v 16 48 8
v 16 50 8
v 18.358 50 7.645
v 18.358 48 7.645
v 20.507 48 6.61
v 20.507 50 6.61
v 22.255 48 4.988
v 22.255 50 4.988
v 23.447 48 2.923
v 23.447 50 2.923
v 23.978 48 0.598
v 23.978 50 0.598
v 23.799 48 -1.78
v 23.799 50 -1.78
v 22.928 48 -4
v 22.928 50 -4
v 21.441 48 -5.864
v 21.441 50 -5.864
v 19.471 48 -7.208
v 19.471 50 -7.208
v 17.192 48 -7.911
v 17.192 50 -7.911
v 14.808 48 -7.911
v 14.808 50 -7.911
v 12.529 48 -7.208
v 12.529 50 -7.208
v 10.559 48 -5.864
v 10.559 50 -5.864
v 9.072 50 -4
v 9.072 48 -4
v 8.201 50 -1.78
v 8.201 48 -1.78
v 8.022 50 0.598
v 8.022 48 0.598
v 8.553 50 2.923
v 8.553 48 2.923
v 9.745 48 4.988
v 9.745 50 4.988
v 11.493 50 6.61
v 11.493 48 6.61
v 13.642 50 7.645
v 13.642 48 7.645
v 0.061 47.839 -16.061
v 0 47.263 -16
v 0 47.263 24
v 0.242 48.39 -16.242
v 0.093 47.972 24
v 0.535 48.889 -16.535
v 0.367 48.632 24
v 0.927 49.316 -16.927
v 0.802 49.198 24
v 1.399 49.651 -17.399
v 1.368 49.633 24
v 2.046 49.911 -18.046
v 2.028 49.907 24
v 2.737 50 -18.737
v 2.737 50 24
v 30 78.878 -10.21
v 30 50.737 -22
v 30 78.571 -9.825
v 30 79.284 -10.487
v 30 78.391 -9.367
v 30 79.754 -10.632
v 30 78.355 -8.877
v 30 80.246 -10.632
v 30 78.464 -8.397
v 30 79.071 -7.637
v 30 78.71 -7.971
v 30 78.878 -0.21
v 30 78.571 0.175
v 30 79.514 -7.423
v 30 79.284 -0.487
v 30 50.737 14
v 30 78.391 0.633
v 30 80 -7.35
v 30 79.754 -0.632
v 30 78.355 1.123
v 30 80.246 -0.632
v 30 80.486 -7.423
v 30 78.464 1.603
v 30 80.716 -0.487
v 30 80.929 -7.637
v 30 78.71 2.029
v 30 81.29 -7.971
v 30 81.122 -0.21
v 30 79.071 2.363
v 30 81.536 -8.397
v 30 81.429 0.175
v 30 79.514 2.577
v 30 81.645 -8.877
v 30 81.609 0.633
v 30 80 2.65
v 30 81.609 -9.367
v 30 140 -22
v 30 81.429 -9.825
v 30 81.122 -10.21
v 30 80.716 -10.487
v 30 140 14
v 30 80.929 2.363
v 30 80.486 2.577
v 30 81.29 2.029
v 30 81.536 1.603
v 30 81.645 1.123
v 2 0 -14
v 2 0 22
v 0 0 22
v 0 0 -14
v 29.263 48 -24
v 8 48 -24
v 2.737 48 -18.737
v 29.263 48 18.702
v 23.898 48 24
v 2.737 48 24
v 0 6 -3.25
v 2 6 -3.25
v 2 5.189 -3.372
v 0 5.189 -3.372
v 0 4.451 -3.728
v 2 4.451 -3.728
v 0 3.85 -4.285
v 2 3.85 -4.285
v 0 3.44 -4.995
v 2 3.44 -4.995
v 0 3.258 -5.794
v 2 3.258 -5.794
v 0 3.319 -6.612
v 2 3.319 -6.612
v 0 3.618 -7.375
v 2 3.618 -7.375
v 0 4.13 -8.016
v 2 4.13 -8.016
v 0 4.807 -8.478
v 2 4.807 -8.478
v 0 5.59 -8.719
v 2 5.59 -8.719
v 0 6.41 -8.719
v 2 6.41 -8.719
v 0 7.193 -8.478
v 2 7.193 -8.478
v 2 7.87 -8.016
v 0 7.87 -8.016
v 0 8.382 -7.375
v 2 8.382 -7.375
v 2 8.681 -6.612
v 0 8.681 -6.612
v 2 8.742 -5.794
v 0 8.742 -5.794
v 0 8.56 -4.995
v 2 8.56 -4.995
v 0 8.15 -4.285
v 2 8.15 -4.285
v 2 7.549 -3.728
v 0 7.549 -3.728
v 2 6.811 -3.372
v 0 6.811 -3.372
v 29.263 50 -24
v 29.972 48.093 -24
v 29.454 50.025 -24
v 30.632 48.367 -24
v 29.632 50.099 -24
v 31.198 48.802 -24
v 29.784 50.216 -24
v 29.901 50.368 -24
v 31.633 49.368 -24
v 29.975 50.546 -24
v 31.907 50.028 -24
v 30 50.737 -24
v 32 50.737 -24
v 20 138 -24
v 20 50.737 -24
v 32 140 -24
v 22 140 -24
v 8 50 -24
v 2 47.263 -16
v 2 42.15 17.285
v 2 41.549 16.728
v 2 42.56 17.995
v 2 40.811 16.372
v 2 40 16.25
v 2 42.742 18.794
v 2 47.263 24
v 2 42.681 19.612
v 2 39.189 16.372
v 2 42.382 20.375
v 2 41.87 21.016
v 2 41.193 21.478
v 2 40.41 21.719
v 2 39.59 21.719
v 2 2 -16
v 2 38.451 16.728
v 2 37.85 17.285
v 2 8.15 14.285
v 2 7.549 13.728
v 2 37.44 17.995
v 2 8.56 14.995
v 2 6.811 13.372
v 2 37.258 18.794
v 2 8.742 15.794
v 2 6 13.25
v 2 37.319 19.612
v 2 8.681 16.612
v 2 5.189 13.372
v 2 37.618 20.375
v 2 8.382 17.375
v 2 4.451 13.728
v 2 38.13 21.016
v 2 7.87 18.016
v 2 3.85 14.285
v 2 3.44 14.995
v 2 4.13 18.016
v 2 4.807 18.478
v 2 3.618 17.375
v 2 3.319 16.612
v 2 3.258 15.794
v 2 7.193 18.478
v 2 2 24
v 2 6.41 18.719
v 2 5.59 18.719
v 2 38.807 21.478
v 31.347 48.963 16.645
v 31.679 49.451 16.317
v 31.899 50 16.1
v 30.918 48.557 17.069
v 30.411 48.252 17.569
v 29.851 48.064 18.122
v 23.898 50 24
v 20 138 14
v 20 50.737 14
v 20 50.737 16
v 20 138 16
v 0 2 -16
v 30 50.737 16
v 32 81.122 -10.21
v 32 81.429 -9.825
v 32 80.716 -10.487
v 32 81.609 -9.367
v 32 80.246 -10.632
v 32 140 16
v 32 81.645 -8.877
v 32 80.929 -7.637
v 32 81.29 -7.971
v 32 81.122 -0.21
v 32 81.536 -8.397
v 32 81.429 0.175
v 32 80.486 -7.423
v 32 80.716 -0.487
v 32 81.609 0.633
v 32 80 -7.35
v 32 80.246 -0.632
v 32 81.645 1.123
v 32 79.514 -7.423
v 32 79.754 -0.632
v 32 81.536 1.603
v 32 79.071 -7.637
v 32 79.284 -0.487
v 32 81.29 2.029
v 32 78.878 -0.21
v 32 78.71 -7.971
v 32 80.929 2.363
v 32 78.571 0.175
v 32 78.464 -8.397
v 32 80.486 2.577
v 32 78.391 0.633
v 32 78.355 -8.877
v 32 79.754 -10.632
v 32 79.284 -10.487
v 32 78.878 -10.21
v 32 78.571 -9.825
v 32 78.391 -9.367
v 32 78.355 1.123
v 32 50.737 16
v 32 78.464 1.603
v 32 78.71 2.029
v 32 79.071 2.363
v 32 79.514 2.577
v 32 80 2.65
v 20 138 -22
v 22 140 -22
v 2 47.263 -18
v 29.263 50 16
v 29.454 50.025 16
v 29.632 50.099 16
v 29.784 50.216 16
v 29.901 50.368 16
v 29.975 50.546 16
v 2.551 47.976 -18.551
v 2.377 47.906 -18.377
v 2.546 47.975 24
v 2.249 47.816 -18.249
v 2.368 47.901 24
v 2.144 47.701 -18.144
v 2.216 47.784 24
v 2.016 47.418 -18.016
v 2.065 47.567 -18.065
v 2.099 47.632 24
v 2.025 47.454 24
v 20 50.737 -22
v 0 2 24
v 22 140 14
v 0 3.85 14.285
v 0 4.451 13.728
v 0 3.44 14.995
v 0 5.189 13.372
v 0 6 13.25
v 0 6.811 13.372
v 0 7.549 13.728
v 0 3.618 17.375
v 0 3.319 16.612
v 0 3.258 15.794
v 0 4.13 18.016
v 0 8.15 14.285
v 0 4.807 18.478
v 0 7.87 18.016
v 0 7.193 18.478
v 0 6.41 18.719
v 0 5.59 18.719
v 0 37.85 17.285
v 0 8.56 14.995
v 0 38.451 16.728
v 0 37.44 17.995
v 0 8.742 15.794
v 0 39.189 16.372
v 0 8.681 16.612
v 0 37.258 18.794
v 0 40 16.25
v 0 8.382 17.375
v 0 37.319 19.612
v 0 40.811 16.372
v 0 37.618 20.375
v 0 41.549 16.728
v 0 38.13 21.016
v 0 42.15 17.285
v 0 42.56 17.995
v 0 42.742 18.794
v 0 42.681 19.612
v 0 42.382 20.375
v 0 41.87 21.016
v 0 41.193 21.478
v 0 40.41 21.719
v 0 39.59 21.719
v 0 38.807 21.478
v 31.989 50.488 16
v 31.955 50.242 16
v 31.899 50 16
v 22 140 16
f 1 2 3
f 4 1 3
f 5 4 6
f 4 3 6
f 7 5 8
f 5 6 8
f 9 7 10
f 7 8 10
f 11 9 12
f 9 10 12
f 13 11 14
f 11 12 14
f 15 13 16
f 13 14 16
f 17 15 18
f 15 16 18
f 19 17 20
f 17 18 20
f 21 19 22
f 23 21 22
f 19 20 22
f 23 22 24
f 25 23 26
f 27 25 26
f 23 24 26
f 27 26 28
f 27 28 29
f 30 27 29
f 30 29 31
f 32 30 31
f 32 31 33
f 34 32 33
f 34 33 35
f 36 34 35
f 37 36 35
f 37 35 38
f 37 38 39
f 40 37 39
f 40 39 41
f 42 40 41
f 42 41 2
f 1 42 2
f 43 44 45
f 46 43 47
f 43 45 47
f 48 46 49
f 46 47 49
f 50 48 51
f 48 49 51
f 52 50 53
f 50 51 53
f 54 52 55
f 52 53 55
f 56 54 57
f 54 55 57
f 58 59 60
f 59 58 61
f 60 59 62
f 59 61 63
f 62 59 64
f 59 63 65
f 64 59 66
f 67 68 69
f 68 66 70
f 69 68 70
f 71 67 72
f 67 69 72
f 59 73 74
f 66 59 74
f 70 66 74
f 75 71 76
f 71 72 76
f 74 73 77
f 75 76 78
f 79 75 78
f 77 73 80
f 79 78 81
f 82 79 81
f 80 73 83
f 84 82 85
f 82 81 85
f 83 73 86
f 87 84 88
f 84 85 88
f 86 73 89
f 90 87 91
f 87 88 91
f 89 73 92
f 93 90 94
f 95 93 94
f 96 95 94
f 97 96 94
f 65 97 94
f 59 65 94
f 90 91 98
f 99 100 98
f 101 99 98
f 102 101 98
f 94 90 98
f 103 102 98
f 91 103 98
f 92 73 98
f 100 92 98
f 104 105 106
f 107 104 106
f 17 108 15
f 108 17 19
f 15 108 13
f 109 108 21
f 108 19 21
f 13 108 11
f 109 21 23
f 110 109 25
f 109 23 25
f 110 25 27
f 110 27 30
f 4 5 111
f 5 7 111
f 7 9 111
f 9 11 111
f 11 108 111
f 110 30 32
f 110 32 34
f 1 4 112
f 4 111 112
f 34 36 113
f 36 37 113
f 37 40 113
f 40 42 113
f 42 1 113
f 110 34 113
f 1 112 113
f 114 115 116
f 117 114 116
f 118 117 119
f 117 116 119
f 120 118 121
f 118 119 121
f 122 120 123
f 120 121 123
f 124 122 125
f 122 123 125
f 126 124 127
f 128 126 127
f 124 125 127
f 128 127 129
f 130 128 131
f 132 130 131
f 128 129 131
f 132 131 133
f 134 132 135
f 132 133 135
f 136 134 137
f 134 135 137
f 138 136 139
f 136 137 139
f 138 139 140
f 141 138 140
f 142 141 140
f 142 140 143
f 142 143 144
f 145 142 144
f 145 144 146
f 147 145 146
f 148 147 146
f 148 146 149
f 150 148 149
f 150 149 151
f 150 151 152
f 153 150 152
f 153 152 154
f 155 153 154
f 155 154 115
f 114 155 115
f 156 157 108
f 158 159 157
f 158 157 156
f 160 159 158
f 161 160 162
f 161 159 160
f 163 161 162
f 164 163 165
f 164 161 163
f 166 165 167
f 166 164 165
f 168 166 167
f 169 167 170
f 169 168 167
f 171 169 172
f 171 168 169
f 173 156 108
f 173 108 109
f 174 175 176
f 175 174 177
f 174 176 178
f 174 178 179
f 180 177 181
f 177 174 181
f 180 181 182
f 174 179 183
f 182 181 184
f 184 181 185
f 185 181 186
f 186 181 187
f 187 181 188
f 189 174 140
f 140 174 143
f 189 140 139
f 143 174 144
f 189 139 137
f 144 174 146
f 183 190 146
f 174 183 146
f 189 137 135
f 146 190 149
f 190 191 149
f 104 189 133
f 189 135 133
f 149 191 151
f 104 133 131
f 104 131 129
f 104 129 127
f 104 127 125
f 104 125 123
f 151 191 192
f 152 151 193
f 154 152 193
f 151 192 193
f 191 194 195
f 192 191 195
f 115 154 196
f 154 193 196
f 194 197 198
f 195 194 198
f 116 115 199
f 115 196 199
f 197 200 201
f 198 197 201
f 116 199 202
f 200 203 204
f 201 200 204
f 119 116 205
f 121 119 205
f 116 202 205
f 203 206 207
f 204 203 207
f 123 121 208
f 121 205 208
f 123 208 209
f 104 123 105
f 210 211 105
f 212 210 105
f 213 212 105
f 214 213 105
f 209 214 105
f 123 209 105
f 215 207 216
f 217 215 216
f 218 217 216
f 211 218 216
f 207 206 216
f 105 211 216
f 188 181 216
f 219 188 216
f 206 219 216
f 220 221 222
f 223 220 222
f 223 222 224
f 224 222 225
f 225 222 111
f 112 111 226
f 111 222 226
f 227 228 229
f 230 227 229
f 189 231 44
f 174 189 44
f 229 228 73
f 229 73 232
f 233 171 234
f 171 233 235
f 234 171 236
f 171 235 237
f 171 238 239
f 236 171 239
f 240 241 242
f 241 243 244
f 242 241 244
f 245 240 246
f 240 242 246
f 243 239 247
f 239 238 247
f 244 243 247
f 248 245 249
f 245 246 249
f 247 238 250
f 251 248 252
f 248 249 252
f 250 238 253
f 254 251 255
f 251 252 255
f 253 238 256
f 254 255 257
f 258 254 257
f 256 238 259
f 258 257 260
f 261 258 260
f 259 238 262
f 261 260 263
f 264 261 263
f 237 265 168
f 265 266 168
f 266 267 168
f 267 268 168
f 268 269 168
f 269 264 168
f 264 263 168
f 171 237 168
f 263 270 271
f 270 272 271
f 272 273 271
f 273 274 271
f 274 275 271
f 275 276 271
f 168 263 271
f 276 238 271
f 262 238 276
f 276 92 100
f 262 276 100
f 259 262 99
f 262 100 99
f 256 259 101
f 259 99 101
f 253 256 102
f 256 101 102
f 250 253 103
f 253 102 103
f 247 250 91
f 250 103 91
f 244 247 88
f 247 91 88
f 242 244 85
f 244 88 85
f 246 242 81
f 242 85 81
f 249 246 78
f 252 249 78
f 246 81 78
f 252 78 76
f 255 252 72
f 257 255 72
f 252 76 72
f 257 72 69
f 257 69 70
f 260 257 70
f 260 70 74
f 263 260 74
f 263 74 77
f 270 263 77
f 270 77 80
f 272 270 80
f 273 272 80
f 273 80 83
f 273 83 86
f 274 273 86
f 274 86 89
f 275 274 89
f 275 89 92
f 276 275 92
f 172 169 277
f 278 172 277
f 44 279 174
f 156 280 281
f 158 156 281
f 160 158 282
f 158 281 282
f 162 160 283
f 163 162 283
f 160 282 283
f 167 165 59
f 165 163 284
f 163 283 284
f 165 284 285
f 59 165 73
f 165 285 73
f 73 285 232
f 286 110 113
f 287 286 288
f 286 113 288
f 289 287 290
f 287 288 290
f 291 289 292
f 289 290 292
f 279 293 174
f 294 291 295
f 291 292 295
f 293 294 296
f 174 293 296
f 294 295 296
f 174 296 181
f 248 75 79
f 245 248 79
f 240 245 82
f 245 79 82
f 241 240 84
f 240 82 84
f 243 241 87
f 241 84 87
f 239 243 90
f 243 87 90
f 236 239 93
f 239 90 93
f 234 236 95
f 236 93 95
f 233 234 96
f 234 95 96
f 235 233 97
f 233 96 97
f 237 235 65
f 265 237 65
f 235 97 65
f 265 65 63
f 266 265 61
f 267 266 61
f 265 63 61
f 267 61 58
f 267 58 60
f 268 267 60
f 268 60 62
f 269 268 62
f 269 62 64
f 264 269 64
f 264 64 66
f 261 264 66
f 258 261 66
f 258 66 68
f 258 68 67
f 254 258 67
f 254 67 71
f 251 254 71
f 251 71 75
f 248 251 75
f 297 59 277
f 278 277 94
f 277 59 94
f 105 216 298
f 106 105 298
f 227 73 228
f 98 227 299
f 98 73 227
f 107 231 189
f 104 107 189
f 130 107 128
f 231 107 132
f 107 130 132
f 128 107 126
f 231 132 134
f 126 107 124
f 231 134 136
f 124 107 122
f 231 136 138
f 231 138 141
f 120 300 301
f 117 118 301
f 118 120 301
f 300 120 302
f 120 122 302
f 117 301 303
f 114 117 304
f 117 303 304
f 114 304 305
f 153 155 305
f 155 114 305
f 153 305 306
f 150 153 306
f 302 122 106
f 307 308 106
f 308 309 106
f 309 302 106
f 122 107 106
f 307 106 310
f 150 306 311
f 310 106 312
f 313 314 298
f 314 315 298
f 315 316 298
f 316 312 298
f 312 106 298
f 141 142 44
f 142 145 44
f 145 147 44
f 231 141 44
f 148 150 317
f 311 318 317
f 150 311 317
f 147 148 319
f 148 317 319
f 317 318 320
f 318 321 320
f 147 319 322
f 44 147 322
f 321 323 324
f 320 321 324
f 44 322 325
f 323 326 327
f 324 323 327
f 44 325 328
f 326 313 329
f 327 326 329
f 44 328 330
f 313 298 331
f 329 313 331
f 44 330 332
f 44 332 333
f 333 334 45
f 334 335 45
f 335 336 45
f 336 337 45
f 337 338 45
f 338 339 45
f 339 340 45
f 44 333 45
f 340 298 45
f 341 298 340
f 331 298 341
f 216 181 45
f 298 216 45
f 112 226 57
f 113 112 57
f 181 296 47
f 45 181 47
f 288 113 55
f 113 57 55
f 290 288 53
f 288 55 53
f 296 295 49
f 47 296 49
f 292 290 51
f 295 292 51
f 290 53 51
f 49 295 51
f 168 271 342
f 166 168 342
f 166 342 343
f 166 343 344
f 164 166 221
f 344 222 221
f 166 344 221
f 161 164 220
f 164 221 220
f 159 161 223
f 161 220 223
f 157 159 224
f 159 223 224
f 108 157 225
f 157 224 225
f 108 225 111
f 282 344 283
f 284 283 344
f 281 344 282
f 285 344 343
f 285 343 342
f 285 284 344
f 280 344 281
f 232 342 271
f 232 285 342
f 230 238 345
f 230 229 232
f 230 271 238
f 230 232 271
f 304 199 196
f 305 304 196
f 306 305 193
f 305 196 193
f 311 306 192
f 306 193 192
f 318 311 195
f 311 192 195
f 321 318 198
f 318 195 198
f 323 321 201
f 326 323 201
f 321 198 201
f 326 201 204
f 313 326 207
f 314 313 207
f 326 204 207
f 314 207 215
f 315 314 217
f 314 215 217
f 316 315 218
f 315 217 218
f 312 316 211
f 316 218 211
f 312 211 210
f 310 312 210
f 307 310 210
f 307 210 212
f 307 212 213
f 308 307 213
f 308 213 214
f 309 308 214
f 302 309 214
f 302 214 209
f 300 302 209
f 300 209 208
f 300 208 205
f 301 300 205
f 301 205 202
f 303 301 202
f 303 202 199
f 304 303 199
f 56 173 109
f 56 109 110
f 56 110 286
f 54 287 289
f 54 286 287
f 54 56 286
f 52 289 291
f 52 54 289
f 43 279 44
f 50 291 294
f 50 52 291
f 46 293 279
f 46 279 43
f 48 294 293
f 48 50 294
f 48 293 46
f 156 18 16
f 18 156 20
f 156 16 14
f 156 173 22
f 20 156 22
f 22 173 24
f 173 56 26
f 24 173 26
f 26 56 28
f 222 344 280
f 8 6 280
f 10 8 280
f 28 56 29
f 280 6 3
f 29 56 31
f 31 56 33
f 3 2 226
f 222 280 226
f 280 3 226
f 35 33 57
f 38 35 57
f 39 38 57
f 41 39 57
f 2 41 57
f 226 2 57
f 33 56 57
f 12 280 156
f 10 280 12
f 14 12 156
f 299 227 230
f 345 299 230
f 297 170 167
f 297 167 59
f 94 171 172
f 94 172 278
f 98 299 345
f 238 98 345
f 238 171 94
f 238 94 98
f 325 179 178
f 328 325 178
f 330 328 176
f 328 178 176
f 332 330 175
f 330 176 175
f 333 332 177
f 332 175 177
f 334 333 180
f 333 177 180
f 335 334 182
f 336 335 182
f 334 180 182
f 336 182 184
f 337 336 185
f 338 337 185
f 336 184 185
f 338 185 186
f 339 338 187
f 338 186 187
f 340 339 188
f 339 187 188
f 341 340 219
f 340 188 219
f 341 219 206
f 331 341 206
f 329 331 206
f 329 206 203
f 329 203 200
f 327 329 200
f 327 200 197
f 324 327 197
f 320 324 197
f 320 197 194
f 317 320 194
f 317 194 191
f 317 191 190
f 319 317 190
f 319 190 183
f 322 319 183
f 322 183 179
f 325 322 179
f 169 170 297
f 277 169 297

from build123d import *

# Parameters (mm, degrees)
SM_BASE_FLANGE_1_DEPTH = 24
SKETCH_3_R             = 2.75
CUT_EXTRUDE_1_DEPTH    = 146.175755552
SKETCH_4_W             = 8
SKETCH_4_H             = 90
SKETCH_4_H_2           = 47.2634
CUT_EXTRUDE_2_DEPTH    = 146.602197786
CUT_EXTRUDE_3_DEPTH    = 99.488578018
SKETCH_9_W             = 2
SKETCH_9_H             = 89.2634
EXTRUDE_1_DEPTH        = 10
CHAMFER_1_SIZE         = 2
M4X0_7_1_D             = 3.3
M4X0_7_1_DEPTH         = 10.1
M4X0_7_1_TIP           = 0.991420021
SKETCH_12_R            = 8
CUT_EXTRUDE_4_DEPTH    = 99.488578018
SKETCH_13_R            = 2.75
CUT_EXTRUDE_5_DEPTH    = 146.175755552


# Sheet-metal steps are written as plain solids
with BuildPart() as part:
    # Sketch 1 → 基体-法兰1 (new, symmetric)
    with BuildSketch(Plane.XY):
        with BuildLine():
            Line((0, 0), (0, 47.2634))
            ThreePointArc((0, 47.2634), (0.801531583, 49.198468417), (2.7366, 50))
            Line((2.7366, 50), (29.2634, 50))
            ThreePointArc((29.2634, 50), (29.784254855, 50.215745145), (30, 50.7366))
            Line((30, 50.7366), (30, 140))
            Line((30, 140), (32, 140))
            Line((32, 140), (32, 50.7366))
            ThreePointArc((32, 50.7366), (31.198468417, 48.801531583), (29.2634, 48))
            Line((29.2634, 48), (2.7366, 48))
            ThreePointArc((2.7366, 48), (2.215745145, 47.784254855), (2, 47.2634))
            Line((2, 47.2634), (2, 0))
            Line((2, 0), (0, 0))
        make_face()
    extrude(amount=SM_BASE_FLANGE_1_DEPTH, both=True)

    # 草图3 → 切除-拉伸1 (cut, through all)
    with BuildSketch(Plane(origin=(2, 0, 0), x_dir=(0, 0, -1), z_dir=(1, 0, 0))):
        with Locations((-16, 6)):
            Circle(SKETCH_3_R)
        with Locations(Location((6, 6, 0), (0, 0, 180))):
            Circle(SKETCH_3_R)
    extrude(amount=-CUT_EXTRUDE_1_DEPTH, mode=Mode.SUBTRACT)

    # 草图4 → 切除-拉伸2 (cut, through all)
    with BuildSketch(Plane.ZY):
        with Locations((20, 95)):
            Rectangle(SKETCH_4_W, SKETCH_4_H)
        with Locations((-20, 23.6317)):
            Rectangle(SKETCH_4_W, SKETCH_4_H_2)
    extrude(amount=-CUT_EXTRUDE_2_DEPTH, mode=Mode.SUBTRACT)

    # 草图5 → 切除-拉伸3 (cut, through all)
    with BuildSketch(Plane(origin=(0, 50, 0), x_dir=(1, 0, 0), z_dir=(0, 1, 0))):
        Polygon((0, 24), (8, 24), (0, 16), align=None)
        Polygon((32, -16), (23.898364891, -24), (31.899002398, -24), align=None)
    extrude(amount=-CUT_EXTRUDE_3_DEPTH, mode=Mode.SUBTRACT)

    # 草图9 → 凸台-拉伸1 (add)
    with BuildSketch(Plane.ZY.offset(-30)):
        with Locations((-23, 95.3683)):
            Rectangle(SKETCH_9_W, SKETCH_9_H)
        with Locations((15, 95.3683)):
            Rectangle(SKETCH_9_W, SKETCH_9_H)
    extrude(amount=EXTRUDE_1_DEPTH)

    # 倒角1
    chamfer_1_edges = [part.edges().sort_by_distance(p)[0] for p in [
        (20, 140, -23),
        (20, 140, 15),
        (1, 0, 24),
        (1, 0, -16),
    ]]
    chamfer(chamfer_1_edges, length=CHAMFER_1_SIZE)

    # M4x0.7 螺纹孔1
    with Locations(Plane(origin=(32, 0, 0), x_dir=(0, 0, -1), z_dir=(1, 0, 0))):
        with Locations((-1, 80), (9, 80)):
            Hole(M4X0_7_1_D / 2, depth=M4X0_7_1_DEPTH)
            with Locations((0, 0, -(M4X0_7_1_DEPTH + M4X0_7_1_TIP / 2))):  # 118° drill point
                Cone(0, M4X0_7_1_D / 2, M4X0_7_1_TIP, mode=Mode.SUBTRACT)

    # 草图12 → 切除-拉伸4 (cut, through all)
    with BuildSketch(Plane(origin=(0, 50, 0), x_dir=(1, 0, 0), z_dir=(0, 1, 0))):
        with Locations(Location((16, 0, 0), (0, 0, 270))):
            Circle(SKETCH_12_R)
    extrude(amount=-CUT_EXTRUDE_4_DEPTH, mode=Mode.SUBTRACT)

    # 草图13 → 切除-拉伸5 (cut, through all)
    with BuildSketch(Plane(origin=(2, 0, 0), x_dir=(0, 0, -1), z_dir=(1, 0, 0))):
        with Locations((-19, 40)):
            Circle(SKETCH_13_R)
    extrude(amount=-CUT_EXTRUDE_5_DEPTH, mode=Mode.SUBTRACT)


solid = part.part
